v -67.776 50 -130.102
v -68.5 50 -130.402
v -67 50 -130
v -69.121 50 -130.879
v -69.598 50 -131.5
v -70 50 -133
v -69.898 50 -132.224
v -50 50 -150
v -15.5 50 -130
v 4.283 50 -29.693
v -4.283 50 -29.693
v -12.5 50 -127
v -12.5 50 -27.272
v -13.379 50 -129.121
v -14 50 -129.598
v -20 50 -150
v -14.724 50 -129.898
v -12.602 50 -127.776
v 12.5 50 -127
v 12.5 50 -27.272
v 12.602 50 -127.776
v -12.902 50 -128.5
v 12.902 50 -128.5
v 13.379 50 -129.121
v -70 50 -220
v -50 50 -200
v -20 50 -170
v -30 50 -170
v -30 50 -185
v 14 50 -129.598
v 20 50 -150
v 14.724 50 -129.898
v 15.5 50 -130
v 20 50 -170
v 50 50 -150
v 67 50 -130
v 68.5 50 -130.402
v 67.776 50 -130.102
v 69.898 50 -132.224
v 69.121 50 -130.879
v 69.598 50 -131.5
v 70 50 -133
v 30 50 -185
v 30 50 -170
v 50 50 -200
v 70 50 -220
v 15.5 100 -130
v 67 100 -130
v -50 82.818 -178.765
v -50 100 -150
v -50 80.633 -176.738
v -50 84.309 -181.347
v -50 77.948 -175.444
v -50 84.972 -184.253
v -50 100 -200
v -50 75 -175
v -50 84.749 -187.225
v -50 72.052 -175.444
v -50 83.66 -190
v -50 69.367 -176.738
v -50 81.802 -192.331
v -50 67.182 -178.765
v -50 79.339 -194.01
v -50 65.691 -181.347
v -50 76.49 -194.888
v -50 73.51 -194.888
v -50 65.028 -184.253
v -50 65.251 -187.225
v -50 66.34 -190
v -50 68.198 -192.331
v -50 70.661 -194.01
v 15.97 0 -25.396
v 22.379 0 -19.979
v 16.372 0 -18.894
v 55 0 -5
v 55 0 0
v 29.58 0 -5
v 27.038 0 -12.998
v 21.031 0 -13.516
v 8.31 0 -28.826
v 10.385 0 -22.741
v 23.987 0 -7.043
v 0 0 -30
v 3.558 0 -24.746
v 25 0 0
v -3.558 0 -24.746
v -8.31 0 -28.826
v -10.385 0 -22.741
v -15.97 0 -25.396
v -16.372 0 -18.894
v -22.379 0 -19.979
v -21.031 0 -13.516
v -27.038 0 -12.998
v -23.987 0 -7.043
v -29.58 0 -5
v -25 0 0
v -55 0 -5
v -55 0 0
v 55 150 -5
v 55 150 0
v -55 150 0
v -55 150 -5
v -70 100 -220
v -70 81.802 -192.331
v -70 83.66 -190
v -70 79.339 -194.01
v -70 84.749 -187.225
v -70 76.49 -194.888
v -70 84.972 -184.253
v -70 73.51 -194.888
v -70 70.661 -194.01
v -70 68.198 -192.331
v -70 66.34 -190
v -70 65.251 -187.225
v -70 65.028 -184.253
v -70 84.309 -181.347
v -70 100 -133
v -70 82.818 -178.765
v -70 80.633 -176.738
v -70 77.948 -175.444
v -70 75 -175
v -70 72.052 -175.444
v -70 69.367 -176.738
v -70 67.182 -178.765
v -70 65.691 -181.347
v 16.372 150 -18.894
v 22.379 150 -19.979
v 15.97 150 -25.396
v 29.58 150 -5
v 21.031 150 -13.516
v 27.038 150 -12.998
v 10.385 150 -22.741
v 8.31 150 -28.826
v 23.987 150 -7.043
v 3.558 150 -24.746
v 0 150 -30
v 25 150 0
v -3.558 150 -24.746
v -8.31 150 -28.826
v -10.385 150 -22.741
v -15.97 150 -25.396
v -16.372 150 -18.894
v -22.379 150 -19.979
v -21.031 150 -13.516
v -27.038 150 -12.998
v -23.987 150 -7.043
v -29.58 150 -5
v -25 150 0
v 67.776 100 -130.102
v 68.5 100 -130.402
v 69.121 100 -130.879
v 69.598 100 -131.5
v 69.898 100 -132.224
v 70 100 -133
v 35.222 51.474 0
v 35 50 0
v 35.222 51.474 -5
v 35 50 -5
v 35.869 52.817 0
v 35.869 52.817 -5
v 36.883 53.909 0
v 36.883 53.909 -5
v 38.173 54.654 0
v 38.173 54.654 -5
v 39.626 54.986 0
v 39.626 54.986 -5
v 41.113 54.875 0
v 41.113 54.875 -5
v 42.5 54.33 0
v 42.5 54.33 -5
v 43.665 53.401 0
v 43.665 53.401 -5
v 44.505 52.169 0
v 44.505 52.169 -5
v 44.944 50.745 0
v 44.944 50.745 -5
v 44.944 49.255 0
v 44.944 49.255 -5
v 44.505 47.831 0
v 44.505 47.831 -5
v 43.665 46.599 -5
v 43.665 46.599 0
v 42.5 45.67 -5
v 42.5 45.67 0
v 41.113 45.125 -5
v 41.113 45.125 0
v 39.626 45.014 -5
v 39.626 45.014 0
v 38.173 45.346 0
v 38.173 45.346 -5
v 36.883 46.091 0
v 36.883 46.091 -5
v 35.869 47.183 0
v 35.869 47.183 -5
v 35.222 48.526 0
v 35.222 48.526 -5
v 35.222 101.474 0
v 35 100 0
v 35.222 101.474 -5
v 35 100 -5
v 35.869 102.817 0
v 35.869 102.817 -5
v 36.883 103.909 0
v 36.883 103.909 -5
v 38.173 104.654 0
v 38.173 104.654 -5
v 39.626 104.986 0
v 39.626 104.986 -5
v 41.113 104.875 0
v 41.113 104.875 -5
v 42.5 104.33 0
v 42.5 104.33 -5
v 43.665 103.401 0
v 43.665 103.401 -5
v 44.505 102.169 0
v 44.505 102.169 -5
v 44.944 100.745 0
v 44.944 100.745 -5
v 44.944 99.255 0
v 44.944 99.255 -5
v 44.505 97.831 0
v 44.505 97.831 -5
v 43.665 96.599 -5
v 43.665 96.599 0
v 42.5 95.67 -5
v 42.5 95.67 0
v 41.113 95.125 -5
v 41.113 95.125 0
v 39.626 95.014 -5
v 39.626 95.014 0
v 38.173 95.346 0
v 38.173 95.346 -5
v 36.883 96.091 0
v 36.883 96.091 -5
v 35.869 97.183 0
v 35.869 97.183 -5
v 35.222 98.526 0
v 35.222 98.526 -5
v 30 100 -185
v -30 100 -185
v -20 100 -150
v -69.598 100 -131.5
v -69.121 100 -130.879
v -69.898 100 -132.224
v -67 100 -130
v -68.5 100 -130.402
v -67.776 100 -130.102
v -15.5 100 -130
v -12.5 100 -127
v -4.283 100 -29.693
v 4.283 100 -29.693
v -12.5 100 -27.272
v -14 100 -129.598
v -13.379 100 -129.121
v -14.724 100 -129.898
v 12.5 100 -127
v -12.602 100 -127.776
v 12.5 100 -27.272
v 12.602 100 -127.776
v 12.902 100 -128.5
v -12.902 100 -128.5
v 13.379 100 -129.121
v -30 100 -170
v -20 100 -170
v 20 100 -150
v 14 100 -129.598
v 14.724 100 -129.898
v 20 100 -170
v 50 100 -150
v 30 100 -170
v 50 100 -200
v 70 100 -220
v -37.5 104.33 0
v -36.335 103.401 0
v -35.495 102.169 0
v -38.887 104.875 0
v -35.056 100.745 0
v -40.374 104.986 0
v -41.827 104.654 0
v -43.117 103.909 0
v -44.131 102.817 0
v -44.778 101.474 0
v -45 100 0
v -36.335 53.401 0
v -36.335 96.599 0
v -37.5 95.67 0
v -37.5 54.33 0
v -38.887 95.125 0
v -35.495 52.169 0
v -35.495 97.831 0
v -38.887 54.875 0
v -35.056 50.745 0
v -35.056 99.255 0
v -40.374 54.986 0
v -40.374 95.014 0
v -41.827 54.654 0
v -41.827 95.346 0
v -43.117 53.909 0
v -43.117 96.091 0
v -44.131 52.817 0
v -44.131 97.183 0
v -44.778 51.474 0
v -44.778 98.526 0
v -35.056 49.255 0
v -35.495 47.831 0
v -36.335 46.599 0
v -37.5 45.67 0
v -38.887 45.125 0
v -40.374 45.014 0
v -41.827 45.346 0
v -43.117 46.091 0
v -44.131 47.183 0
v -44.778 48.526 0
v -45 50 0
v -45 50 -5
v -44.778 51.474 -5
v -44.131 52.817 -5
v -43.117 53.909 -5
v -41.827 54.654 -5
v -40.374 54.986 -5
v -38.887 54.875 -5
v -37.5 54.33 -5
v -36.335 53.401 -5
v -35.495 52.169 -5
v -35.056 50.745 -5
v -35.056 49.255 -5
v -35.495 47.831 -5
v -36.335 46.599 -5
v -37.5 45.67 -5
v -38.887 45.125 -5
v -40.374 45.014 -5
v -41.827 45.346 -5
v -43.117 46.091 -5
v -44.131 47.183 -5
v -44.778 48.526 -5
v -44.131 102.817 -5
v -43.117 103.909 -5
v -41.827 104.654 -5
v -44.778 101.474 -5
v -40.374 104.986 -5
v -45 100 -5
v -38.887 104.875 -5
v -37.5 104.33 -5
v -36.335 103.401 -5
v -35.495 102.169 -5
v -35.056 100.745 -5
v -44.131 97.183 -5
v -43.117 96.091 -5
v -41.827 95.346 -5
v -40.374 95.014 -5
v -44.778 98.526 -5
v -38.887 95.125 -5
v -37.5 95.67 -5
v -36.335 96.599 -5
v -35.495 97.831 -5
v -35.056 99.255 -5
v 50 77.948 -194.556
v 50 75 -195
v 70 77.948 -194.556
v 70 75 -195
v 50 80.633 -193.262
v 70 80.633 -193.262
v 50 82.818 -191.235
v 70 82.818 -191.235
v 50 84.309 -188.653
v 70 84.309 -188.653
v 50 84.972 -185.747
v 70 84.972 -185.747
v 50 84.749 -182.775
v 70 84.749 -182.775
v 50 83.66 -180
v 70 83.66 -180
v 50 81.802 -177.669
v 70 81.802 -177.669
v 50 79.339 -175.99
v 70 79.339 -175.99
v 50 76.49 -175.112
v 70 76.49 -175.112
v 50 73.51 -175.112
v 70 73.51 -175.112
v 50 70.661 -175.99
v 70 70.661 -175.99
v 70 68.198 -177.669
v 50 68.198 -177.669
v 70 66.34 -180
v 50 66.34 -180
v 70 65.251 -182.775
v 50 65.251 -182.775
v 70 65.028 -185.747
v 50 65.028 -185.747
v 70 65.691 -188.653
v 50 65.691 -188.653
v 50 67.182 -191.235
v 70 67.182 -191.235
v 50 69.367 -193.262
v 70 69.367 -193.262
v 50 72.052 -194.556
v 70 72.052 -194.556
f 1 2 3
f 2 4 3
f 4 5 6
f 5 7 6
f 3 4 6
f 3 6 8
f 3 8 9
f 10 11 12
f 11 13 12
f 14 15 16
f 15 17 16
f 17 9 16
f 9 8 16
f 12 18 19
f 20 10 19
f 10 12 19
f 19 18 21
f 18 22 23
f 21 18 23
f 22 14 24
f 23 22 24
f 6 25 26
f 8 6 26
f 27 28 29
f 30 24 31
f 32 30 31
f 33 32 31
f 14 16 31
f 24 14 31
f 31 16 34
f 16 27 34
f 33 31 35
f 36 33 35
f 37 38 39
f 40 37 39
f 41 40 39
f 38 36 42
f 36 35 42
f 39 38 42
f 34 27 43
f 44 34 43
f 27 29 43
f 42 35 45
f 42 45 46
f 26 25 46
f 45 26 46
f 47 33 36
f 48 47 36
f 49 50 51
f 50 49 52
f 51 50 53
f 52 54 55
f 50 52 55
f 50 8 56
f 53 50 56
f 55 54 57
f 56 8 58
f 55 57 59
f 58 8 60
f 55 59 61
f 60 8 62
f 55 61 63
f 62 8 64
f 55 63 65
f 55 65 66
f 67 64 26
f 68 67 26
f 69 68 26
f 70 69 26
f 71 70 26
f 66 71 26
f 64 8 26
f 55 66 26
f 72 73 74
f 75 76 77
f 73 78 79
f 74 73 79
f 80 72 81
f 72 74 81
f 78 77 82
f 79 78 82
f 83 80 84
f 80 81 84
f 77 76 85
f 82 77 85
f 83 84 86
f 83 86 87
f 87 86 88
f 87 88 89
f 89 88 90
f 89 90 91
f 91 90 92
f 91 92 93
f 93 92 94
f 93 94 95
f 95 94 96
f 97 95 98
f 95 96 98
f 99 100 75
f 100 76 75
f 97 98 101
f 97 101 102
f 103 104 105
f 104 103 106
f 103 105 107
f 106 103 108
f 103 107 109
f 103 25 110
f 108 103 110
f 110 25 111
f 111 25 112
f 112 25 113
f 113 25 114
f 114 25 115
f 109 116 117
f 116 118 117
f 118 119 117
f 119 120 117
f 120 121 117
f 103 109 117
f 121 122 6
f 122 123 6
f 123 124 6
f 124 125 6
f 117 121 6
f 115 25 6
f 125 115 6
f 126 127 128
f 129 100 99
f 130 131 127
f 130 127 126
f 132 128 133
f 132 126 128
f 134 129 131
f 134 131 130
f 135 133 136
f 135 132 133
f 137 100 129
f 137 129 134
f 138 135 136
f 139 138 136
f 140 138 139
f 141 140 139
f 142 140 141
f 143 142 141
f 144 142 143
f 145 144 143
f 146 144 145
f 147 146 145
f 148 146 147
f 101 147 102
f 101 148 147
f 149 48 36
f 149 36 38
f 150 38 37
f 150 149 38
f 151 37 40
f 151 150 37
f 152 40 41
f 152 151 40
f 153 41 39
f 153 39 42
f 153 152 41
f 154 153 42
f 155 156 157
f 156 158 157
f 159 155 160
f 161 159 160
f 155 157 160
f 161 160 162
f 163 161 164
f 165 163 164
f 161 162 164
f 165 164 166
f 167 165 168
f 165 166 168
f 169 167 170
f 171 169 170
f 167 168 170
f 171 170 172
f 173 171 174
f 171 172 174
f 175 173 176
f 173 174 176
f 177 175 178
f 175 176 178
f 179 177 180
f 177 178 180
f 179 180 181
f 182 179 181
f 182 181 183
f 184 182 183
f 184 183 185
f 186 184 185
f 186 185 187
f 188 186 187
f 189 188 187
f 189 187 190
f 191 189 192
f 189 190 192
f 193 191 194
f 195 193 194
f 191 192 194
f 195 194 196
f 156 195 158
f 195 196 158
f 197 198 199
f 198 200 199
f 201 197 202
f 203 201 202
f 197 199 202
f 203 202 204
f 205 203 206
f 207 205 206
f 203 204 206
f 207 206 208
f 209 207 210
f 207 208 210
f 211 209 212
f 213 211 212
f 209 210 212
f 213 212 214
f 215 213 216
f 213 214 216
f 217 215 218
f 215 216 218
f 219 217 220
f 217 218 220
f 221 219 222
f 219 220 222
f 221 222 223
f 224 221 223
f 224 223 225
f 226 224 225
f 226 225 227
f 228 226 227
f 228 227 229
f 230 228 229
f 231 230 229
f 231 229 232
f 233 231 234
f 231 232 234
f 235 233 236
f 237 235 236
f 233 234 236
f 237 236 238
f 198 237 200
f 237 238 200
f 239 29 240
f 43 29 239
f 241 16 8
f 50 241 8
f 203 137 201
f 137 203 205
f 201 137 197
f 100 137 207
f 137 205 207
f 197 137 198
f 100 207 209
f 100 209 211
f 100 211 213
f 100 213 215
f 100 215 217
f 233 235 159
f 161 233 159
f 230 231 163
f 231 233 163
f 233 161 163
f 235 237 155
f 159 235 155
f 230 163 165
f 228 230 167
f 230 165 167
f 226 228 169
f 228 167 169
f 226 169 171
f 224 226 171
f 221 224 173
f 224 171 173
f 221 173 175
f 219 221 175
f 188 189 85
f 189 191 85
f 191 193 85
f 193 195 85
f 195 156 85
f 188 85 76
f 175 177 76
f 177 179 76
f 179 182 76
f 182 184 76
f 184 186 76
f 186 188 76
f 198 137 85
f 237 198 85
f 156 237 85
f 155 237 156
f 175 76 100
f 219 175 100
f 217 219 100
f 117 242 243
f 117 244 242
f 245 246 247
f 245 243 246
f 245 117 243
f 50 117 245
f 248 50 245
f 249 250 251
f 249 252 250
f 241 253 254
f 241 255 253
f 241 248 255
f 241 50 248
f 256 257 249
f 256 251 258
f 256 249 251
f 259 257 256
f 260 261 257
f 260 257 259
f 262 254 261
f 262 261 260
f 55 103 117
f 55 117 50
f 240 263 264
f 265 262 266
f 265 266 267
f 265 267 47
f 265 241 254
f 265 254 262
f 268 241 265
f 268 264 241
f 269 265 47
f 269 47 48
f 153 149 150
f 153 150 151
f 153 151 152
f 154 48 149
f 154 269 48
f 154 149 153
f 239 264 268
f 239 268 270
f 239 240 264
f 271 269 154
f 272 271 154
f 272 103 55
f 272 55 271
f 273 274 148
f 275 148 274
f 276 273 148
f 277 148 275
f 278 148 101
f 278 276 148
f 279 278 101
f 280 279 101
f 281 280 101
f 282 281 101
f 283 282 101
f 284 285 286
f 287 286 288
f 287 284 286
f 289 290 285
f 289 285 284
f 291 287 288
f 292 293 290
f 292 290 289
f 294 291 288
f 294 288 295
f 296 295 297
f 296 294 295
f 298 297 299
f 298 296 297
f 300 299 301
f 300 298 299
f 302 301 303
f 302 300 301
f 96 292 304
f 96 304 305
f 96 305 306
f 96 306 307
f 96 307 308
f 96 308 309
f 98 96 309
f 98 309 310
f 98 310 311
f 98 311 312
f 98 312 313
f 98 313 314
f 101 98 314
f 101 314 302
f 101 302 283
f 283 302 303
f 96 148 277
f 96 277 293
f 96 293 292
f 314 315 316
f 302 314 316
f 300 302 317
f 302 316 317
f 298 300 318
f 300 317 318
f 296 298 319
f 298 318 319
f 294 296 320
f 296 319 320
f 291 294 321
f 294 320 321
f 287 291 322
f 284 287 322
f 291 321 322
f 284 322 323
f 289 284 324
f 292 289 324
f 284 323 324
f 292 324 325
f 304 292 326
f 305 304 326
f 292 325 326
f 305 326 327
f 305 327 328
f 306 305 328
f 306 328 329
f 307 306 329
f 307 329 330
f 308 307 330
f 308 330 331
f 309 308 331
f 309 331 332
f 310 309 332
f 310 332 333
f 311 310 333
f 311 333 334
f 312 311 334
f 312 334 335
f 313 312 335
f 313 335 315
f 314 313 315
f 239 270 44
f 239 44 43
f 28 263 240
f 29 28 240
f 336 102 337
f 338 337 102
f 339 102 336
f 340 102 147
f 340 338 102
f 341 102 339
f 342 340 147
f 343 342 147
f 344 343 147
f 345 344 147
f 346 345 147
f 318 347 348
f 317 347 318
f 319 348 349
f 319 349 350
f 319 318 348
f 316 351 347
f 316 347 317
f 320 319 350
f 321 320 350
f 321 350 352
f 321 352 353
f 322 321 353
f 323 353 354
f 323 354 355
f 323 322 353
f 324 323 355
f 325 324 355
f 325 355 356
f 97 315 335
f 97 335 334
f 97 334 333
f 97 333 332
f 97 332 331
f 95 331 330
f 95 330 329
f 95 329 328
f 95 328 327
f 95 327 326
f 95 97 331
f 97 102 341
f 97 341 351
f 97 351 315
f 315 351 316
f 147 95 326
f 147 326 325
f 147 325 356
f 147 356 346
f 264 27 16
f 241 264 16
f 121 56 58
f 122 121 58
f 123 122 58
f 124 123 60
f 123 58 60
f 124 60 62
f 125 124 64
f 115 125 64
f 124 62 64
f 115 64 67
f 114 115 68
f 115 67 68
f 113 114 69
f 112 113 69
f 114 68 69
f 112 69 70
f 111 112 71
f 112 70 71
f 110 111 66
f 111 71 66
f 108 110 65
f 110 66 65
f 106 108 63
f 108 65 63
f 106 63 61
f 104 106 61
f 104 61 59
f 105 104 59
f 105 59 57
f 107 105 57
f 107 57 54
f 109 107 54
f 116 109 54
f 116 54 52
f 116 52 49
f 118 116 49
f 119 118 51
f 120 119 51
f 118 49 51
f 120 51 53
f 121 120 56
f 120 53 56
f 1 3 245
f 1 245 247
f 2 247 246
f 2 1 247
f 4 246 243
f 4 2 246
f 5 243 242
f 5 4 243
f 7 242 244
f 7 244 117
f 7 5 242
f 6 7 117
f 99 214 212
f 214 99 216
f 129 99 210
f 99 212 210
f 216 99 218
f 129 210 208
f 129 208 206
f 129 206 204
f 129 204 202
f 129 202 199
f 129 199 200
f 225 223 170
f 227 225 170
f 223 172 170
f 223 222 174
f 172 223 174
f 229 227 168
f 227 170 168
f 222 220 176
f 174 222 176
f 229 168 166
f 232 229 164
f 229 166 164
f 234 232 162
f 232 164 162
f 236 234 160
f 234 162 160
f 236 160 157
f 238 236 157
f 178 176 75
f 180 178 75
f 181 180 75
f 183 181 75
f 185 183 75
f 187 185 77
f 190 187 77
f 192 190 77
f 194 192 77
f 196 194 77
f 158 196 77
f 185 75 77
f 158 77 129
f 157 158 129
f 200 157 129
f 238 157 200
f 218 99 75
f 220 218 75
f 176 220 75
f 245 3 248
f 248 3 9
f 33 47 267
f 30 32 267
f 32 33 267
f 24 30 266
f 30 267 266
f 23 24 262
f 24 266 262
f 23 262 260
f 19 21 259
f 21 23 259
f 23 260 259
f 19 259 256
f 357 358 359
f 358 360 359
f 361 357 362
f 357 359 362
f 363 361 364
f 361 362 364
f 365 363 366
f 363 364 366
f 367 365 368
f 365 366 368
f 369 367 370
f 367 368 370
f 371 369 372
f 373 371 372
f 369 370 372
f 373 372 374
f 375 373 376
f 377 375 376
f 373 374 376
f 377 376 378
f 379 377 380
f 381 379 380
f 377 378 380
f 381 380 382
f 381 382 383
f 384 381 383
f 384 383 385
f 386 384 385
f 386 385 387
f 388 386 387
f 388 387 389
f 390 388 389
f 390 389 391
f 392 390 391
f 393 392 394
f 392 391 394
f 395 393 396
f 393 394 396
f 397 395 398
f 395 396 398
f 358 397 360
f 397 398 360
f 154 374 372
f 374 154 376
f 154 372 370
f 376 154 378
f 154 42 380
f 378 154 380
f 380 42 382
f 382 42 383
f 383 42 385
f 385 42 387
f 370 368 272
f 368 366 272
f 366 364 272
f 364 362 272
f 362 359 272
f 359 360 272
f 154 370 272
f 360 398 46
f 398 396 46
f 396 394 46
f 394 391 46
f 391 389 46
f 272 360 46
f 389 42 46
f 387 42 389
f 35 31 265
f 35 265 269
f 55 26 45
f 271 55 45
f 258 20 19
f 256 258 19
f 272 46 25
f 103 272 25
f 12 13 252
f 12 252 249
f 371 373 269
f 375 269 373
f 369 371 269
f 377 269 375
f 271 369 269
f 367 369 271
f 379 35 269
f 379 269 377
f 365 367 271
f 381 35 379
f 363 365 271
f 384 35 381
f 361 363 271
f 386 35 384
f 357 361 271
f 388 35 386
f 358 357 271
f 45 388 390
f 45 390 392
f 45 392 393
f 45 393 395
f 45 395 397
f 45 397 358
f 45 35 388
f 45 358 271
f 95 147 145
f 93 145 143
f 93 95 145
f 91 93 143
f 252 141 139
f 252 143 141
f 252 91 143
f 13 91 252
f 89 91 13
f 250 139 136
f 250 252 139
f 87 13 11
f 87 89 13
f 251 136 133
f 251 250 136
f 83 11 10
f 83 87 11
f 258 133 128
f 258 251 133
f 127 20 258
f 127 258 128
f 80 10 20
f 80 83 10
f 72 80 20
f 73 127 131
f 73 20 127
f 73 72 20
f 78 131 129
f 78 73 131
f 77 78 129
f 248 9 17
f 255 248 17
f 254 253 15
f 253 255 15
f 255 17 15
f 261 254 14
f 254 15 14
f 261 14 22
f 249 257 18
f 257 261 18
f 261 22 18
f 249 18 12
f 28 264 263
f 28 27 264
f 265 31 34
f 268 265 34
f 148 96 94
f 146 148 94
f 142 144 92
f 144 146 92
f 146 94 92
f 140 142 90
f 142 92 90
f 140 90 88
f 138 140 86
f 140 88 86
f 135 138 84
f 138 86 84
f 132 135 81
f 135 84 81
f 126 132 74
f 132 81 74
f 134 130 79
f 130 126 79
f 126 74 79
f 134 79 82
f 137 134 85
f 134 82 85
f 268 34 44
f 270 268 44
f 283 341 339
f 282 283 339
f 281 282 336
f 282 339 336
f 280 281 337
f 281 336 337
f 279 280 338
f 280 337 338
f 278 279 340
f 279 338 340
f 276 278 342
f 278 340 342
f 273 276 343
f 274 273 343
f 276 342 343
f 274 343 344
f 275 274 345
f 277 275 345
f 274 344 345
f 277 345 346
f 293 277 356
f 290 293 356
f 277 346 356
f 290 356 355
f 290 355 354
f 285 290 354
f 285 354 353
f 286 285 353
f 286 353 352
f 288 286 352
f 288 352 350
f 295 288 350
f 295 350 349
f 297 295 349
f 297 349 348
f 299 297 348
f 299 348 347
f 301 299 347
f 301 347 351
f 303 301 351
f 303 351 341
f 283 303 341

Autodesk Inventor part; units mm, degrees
ref_plane "YZ Plane" through (0, 0, 0) normal (1, 0, 0) x (0, 1, 0)
ref_plane "XZ Plane" through (0, 0, 0) normal (0, 1, 0) x (-1, 0, 0)
sketch "Sketch1" plane through (0, 0, 0) normal (0, 1, 0) x (-1, 0, 0)
  arc A0 (-25, 0) -> (25, 0) centre (0, 0) ccw
  arc A1 (-29.5804, -5) -> (29.5804, -5) centre (0, 0) ccw
  line L0 (25, 0) -> (55, 0)
  line L1 (55, 0) -> (55, -5)
  line L2 (55, -5) -> (29.5804, -5)
  line L3 (-25, 0) -> (-45, 0)
  line L4 (-45, -5) -> (-29.5804, -5)
  line L5 (0, 0) -> (12.5, 0) construction
  line L6 (12.5, -300) -> (0, -300) construction
  line L7 (0, -185) -> (0, 0) construction
  line L8 (0, 0) -> (-12.5, 0) construction
  line L9 (-12.5, -300) -> (0, -300) construction
  line L10 (0, 0) -> (0, -150) construction
  line L11 (-40, -150) -> (40, -150)
  line L12 (40, -160) -> (40, -210)
  line L13 (-30, -210) -> (-40, -210) construction
  line L14 (-40, -210) -> (-40, -160)
  line L15 (-40, -150) -> (40, -210) construction
  line L16 (40, -150) -> (-40, -210) construction
  line L17 (40, -150) -> (50, -150)
  line L18 (50, -150) -> (50, -210)
  line L19 (50, -210) -> (40, -210)
  line L20 (-40, -150) -> (-50, -150)
  line L21 (-50, -150) -> (-50, -210)
  line L22 (-50, -210) -> (-40, -210)
  line L23 (12.5, -150) -> (12.5, -160) construction
  line L24 (12.5, -150) -> (12.5, -160)
  line L25 (40, -160) -> (12.5, -160)
  line L26 (-12.5, -160) -> (-40, -160)
  line L27 (0, -160) -> (20, -160) construction
  line L28 (20, -160) -> (20, -170)
  line L29 (20, -170) -> (30, -170)
  line L30 (30, -170) -> (30, -185)
  line L31 (30, -185) -> (0, -185)
  line L32 (0, -160) -> (-20, -160) construction
  line L33 (-20, -160) -> (-20, -170)
  line L34 (-20, -170) -> (-30, -170)
  line L35 (-30, -170) -> (-30, -185)
  line L36 (-30, -185) -> (0, -185)
  line L37 (-25, 0) -> (-55, 0)
  line L38 (-55, -5) -> (-29.5804, -5)
  line L39 (-55, 0) -> (-55, -5)
  line L40 (12.5, -27.2718) -> (12.5, -150)
  line L41 (-12.5, -27.2718) -> (-12.5, -150)
  point P0 (0, -180)
  dimension "d0" = 50
  dimension "d1" = 60
  dimension "d2" = 30
  dimension "d3" = 5
  dimension "d5" = 5
  dimension "d6" = 12.5
  dimension "d7" = 300
  dimension "d8" = 150
  dimension "d9" = 80
  dimension "d10" = 60
  dimension "d11" = 10
  dimension "d12" = 10
  dimension "d13" = 20
  dimension "d14" = 10
  dimension "d15" = 10
  dimension "d16" = 15
extrude "Extrusion1" add sketch "Sketch1" along normal blind 150 contours A0 L0 L1 L2 A1 L4 L38 L39 L37 L3
ref_plane "Work Plane1" through (0, 75, 0) normal (0, 1, 0) x (1, 0, 0)
sketch "Sketch3" plane through (0, 75, 0) normal (0, 1, 0) x (1, 0, 0)
  line L0 (25, 0) -> (55, 0)
  line L1 (-25, 0) -> (-45, 0)
  line L2 (0, 0) -> (12.5, 0) construction
  line L3 (0, 0) -> (-12.5, 0) construction
  line L4 (-25, 0) -> (-55, 0)
  arc A0 (25, 0) -> (-25, 0) centre (0, 0) ccw
  arc A1 (29.5804, 5) -> (-29.5804, 5) centre (0, 0) ccw
  line L5 (55, 0) -> (55, 5)
  line L6 (55, 5) -> (29.5804, 5)
  line L7 (-45, 5) -> (-29.5804, 5)
  line L8 (0, 185) -> (0, 0) construction
  line L9 (0, 0) -> (0, 150) construction
  line L10 (-40, 150) -> (40, 210) construction
  line L11 (40, 150) -> (-40, 210) construction
  line L12 (40, 150) -> (50, 150)
  line L13 (50, 150) -> (50, 200)
  line L14 (-50, 150) -> (-50, 200)
  line L15 (-40, 150) -> (-50, 150)
  line L16 (0, 160) -> (12.5, 160) construction
  line L17 (20, 160) -> (20, 170)
  line L18 (20, 170) -> (30, 170)
  line L19 (30, 170) -> (30, 185)
  line L20 (30, 185) -> (0, 185)
  line L21 (0, 160) -> (-12.5, 160) construction
  line L22 (-20, 160) -> (-20, 170)
  line L23 (-20, 170) -> (-30, 170)
  line L24 (-30, 170) -> (-30, 185)
  line L25 (-30, 185) -> (0, 185)
  line L26 (-55, 5) -> (-29.5804, 5)
  line L27 (12.5, 27.2718) -> (12.5, 130)
  line L28 (-12.5, 27.2718) -> (-12.5, 130)
  line L29 (-40, 150) -> (-20, 150)
  line L30 (20, 150) -> (40, 150)
  line L31 (-70, 200) -> (-70, 140)
  line L32 (50, 150) -> (50, 200)
  line L33 (-50, 200) -> (-50, 150)
  line L34 (-50, 150) -> (50, 210) construction
  line L35 (50, 150) -> (-50, 210) construction
  line L36 (20, 160) -> (20, 150)
  line L37 (-20, 160) -> (-20, 150)
  line L38 (-50, 150) -> (-20, 150)
  line L39 (20, 150) -> (50, 150)
  line L40 (70, 200) -> (70, 140)
  line L41 (-50, 150) -> (50, 150)
  line L42 (50, 150) -> (50, 200)
  line L43 (-50, 200) -> (-50, 150)
  line L44 (-70, 140) -> (-70, 130)
  line L45 (-70, 130) -> (-12.5, 130)
  line L46 (12.5, 130) -> (70, 130)
  line L47 (70, 130) -> (70, 140)
  line L48 (-50, 200) -> (50, 200)
  line L49 (70, 200) -> (70, 220)
  line L50 (70, 220) -> (-70, 220)
  line L51 (-70, 220) -> (-70, 200)
  point P0 (-45, -5)
  point P1 (0, 180)
  dimension "d21" = 30
  dimension "d62" = 50
  dimension "d63" = 10
  dimension "d65" = 20
extrude "Extrusion2" add sketch "Sketch3" along normal mid plane 50 contours A1 L28 L45 L44 L31 L51 L50 L49 L40 L47 L46 L27 | L41 L37 L22 L23 L24 L25 L20 L19 L18 L17 L36
sketch "Sketch5" plane through (-50, 50, -150) normal (1, 0, 0) x (0, 0, 1)
  line L0 (-35, 0) -> (-35, -50) construction
  circle A0 centre (-35, -25) radius 10
  point P0 (150, 50)
  dimension "d38" = 20
extrude "Extrusion4" cut sketch "Sketch5" against normal blind 20
sketch "Sketch6" plane through (55, 0, -5) normal (0, 0, -1) x (-1, 0, 0)
  line L0 (30, 0) -> (0, 0) projected
  line L1 (15, 0) -> (15, 50) construction
  line L2 (15, 50) -> (15, 100) construction
  circle A0 centre (15, 100) radius 5
  circle A1 centre (15, 50) radius 5
  point P0 (55, 0)
  dimension "d43" = 50
  dimension "d44" = 50
  dimension "d45" = 10
  dimension "d46" = 10
extrude "Extrusion5" cut sketch "Sketch6" against normal blind 10
sketch "Sketch7" plane through (-29.5804, 0, -5) normal (0, 0, -1) x (-1, 0, 0)
  line L0 (25.4196, 0) -> (-4.5804, 0) projected
  line L1 (10.4196, 50) -> (10.4196, 100) construction
  line L2 (10.4196, 0) -> (10.4196, 50) construction
  line L3 (10.4196, 50) -> (10.4196, 100)
  circle A0 centre (10.4196, 100) radius 5
  circle A1 centre (10.4196, 50) radius 5
  point P0 (-29.5804, 0)
  dimension "d49" = 50
  dimension "d50" = 50
  dimension "d51" = 10
  dimension "d52" = 10
extrude "Extrusion6" cut sketch "Sketch7" against normal blind 10
fillet "Fillet2" radius 3 4 edges at (70, 75, -130) (12.5, 75, -130) (-12.5, 75, -130) (-70, 75, -130)
sketch "Sketch8" plane through (70, 50, -220) normal (1, 0, 0) x (0, 0, -1)
  line L0 (-35, 0) -> (-35, 50) projected
  circle A0 centre (-35, 25) radius 10
  point P0 (-220, -50)
  dimension "d66" = 20
extrude "Extrusion7" cut sketch "Sketch8" against normal blind 20
thread "Thread1" size "M20x2.5" class "6H" standard "ANSI Metric M Profile" full length
properties part number "Clamp jaw"
